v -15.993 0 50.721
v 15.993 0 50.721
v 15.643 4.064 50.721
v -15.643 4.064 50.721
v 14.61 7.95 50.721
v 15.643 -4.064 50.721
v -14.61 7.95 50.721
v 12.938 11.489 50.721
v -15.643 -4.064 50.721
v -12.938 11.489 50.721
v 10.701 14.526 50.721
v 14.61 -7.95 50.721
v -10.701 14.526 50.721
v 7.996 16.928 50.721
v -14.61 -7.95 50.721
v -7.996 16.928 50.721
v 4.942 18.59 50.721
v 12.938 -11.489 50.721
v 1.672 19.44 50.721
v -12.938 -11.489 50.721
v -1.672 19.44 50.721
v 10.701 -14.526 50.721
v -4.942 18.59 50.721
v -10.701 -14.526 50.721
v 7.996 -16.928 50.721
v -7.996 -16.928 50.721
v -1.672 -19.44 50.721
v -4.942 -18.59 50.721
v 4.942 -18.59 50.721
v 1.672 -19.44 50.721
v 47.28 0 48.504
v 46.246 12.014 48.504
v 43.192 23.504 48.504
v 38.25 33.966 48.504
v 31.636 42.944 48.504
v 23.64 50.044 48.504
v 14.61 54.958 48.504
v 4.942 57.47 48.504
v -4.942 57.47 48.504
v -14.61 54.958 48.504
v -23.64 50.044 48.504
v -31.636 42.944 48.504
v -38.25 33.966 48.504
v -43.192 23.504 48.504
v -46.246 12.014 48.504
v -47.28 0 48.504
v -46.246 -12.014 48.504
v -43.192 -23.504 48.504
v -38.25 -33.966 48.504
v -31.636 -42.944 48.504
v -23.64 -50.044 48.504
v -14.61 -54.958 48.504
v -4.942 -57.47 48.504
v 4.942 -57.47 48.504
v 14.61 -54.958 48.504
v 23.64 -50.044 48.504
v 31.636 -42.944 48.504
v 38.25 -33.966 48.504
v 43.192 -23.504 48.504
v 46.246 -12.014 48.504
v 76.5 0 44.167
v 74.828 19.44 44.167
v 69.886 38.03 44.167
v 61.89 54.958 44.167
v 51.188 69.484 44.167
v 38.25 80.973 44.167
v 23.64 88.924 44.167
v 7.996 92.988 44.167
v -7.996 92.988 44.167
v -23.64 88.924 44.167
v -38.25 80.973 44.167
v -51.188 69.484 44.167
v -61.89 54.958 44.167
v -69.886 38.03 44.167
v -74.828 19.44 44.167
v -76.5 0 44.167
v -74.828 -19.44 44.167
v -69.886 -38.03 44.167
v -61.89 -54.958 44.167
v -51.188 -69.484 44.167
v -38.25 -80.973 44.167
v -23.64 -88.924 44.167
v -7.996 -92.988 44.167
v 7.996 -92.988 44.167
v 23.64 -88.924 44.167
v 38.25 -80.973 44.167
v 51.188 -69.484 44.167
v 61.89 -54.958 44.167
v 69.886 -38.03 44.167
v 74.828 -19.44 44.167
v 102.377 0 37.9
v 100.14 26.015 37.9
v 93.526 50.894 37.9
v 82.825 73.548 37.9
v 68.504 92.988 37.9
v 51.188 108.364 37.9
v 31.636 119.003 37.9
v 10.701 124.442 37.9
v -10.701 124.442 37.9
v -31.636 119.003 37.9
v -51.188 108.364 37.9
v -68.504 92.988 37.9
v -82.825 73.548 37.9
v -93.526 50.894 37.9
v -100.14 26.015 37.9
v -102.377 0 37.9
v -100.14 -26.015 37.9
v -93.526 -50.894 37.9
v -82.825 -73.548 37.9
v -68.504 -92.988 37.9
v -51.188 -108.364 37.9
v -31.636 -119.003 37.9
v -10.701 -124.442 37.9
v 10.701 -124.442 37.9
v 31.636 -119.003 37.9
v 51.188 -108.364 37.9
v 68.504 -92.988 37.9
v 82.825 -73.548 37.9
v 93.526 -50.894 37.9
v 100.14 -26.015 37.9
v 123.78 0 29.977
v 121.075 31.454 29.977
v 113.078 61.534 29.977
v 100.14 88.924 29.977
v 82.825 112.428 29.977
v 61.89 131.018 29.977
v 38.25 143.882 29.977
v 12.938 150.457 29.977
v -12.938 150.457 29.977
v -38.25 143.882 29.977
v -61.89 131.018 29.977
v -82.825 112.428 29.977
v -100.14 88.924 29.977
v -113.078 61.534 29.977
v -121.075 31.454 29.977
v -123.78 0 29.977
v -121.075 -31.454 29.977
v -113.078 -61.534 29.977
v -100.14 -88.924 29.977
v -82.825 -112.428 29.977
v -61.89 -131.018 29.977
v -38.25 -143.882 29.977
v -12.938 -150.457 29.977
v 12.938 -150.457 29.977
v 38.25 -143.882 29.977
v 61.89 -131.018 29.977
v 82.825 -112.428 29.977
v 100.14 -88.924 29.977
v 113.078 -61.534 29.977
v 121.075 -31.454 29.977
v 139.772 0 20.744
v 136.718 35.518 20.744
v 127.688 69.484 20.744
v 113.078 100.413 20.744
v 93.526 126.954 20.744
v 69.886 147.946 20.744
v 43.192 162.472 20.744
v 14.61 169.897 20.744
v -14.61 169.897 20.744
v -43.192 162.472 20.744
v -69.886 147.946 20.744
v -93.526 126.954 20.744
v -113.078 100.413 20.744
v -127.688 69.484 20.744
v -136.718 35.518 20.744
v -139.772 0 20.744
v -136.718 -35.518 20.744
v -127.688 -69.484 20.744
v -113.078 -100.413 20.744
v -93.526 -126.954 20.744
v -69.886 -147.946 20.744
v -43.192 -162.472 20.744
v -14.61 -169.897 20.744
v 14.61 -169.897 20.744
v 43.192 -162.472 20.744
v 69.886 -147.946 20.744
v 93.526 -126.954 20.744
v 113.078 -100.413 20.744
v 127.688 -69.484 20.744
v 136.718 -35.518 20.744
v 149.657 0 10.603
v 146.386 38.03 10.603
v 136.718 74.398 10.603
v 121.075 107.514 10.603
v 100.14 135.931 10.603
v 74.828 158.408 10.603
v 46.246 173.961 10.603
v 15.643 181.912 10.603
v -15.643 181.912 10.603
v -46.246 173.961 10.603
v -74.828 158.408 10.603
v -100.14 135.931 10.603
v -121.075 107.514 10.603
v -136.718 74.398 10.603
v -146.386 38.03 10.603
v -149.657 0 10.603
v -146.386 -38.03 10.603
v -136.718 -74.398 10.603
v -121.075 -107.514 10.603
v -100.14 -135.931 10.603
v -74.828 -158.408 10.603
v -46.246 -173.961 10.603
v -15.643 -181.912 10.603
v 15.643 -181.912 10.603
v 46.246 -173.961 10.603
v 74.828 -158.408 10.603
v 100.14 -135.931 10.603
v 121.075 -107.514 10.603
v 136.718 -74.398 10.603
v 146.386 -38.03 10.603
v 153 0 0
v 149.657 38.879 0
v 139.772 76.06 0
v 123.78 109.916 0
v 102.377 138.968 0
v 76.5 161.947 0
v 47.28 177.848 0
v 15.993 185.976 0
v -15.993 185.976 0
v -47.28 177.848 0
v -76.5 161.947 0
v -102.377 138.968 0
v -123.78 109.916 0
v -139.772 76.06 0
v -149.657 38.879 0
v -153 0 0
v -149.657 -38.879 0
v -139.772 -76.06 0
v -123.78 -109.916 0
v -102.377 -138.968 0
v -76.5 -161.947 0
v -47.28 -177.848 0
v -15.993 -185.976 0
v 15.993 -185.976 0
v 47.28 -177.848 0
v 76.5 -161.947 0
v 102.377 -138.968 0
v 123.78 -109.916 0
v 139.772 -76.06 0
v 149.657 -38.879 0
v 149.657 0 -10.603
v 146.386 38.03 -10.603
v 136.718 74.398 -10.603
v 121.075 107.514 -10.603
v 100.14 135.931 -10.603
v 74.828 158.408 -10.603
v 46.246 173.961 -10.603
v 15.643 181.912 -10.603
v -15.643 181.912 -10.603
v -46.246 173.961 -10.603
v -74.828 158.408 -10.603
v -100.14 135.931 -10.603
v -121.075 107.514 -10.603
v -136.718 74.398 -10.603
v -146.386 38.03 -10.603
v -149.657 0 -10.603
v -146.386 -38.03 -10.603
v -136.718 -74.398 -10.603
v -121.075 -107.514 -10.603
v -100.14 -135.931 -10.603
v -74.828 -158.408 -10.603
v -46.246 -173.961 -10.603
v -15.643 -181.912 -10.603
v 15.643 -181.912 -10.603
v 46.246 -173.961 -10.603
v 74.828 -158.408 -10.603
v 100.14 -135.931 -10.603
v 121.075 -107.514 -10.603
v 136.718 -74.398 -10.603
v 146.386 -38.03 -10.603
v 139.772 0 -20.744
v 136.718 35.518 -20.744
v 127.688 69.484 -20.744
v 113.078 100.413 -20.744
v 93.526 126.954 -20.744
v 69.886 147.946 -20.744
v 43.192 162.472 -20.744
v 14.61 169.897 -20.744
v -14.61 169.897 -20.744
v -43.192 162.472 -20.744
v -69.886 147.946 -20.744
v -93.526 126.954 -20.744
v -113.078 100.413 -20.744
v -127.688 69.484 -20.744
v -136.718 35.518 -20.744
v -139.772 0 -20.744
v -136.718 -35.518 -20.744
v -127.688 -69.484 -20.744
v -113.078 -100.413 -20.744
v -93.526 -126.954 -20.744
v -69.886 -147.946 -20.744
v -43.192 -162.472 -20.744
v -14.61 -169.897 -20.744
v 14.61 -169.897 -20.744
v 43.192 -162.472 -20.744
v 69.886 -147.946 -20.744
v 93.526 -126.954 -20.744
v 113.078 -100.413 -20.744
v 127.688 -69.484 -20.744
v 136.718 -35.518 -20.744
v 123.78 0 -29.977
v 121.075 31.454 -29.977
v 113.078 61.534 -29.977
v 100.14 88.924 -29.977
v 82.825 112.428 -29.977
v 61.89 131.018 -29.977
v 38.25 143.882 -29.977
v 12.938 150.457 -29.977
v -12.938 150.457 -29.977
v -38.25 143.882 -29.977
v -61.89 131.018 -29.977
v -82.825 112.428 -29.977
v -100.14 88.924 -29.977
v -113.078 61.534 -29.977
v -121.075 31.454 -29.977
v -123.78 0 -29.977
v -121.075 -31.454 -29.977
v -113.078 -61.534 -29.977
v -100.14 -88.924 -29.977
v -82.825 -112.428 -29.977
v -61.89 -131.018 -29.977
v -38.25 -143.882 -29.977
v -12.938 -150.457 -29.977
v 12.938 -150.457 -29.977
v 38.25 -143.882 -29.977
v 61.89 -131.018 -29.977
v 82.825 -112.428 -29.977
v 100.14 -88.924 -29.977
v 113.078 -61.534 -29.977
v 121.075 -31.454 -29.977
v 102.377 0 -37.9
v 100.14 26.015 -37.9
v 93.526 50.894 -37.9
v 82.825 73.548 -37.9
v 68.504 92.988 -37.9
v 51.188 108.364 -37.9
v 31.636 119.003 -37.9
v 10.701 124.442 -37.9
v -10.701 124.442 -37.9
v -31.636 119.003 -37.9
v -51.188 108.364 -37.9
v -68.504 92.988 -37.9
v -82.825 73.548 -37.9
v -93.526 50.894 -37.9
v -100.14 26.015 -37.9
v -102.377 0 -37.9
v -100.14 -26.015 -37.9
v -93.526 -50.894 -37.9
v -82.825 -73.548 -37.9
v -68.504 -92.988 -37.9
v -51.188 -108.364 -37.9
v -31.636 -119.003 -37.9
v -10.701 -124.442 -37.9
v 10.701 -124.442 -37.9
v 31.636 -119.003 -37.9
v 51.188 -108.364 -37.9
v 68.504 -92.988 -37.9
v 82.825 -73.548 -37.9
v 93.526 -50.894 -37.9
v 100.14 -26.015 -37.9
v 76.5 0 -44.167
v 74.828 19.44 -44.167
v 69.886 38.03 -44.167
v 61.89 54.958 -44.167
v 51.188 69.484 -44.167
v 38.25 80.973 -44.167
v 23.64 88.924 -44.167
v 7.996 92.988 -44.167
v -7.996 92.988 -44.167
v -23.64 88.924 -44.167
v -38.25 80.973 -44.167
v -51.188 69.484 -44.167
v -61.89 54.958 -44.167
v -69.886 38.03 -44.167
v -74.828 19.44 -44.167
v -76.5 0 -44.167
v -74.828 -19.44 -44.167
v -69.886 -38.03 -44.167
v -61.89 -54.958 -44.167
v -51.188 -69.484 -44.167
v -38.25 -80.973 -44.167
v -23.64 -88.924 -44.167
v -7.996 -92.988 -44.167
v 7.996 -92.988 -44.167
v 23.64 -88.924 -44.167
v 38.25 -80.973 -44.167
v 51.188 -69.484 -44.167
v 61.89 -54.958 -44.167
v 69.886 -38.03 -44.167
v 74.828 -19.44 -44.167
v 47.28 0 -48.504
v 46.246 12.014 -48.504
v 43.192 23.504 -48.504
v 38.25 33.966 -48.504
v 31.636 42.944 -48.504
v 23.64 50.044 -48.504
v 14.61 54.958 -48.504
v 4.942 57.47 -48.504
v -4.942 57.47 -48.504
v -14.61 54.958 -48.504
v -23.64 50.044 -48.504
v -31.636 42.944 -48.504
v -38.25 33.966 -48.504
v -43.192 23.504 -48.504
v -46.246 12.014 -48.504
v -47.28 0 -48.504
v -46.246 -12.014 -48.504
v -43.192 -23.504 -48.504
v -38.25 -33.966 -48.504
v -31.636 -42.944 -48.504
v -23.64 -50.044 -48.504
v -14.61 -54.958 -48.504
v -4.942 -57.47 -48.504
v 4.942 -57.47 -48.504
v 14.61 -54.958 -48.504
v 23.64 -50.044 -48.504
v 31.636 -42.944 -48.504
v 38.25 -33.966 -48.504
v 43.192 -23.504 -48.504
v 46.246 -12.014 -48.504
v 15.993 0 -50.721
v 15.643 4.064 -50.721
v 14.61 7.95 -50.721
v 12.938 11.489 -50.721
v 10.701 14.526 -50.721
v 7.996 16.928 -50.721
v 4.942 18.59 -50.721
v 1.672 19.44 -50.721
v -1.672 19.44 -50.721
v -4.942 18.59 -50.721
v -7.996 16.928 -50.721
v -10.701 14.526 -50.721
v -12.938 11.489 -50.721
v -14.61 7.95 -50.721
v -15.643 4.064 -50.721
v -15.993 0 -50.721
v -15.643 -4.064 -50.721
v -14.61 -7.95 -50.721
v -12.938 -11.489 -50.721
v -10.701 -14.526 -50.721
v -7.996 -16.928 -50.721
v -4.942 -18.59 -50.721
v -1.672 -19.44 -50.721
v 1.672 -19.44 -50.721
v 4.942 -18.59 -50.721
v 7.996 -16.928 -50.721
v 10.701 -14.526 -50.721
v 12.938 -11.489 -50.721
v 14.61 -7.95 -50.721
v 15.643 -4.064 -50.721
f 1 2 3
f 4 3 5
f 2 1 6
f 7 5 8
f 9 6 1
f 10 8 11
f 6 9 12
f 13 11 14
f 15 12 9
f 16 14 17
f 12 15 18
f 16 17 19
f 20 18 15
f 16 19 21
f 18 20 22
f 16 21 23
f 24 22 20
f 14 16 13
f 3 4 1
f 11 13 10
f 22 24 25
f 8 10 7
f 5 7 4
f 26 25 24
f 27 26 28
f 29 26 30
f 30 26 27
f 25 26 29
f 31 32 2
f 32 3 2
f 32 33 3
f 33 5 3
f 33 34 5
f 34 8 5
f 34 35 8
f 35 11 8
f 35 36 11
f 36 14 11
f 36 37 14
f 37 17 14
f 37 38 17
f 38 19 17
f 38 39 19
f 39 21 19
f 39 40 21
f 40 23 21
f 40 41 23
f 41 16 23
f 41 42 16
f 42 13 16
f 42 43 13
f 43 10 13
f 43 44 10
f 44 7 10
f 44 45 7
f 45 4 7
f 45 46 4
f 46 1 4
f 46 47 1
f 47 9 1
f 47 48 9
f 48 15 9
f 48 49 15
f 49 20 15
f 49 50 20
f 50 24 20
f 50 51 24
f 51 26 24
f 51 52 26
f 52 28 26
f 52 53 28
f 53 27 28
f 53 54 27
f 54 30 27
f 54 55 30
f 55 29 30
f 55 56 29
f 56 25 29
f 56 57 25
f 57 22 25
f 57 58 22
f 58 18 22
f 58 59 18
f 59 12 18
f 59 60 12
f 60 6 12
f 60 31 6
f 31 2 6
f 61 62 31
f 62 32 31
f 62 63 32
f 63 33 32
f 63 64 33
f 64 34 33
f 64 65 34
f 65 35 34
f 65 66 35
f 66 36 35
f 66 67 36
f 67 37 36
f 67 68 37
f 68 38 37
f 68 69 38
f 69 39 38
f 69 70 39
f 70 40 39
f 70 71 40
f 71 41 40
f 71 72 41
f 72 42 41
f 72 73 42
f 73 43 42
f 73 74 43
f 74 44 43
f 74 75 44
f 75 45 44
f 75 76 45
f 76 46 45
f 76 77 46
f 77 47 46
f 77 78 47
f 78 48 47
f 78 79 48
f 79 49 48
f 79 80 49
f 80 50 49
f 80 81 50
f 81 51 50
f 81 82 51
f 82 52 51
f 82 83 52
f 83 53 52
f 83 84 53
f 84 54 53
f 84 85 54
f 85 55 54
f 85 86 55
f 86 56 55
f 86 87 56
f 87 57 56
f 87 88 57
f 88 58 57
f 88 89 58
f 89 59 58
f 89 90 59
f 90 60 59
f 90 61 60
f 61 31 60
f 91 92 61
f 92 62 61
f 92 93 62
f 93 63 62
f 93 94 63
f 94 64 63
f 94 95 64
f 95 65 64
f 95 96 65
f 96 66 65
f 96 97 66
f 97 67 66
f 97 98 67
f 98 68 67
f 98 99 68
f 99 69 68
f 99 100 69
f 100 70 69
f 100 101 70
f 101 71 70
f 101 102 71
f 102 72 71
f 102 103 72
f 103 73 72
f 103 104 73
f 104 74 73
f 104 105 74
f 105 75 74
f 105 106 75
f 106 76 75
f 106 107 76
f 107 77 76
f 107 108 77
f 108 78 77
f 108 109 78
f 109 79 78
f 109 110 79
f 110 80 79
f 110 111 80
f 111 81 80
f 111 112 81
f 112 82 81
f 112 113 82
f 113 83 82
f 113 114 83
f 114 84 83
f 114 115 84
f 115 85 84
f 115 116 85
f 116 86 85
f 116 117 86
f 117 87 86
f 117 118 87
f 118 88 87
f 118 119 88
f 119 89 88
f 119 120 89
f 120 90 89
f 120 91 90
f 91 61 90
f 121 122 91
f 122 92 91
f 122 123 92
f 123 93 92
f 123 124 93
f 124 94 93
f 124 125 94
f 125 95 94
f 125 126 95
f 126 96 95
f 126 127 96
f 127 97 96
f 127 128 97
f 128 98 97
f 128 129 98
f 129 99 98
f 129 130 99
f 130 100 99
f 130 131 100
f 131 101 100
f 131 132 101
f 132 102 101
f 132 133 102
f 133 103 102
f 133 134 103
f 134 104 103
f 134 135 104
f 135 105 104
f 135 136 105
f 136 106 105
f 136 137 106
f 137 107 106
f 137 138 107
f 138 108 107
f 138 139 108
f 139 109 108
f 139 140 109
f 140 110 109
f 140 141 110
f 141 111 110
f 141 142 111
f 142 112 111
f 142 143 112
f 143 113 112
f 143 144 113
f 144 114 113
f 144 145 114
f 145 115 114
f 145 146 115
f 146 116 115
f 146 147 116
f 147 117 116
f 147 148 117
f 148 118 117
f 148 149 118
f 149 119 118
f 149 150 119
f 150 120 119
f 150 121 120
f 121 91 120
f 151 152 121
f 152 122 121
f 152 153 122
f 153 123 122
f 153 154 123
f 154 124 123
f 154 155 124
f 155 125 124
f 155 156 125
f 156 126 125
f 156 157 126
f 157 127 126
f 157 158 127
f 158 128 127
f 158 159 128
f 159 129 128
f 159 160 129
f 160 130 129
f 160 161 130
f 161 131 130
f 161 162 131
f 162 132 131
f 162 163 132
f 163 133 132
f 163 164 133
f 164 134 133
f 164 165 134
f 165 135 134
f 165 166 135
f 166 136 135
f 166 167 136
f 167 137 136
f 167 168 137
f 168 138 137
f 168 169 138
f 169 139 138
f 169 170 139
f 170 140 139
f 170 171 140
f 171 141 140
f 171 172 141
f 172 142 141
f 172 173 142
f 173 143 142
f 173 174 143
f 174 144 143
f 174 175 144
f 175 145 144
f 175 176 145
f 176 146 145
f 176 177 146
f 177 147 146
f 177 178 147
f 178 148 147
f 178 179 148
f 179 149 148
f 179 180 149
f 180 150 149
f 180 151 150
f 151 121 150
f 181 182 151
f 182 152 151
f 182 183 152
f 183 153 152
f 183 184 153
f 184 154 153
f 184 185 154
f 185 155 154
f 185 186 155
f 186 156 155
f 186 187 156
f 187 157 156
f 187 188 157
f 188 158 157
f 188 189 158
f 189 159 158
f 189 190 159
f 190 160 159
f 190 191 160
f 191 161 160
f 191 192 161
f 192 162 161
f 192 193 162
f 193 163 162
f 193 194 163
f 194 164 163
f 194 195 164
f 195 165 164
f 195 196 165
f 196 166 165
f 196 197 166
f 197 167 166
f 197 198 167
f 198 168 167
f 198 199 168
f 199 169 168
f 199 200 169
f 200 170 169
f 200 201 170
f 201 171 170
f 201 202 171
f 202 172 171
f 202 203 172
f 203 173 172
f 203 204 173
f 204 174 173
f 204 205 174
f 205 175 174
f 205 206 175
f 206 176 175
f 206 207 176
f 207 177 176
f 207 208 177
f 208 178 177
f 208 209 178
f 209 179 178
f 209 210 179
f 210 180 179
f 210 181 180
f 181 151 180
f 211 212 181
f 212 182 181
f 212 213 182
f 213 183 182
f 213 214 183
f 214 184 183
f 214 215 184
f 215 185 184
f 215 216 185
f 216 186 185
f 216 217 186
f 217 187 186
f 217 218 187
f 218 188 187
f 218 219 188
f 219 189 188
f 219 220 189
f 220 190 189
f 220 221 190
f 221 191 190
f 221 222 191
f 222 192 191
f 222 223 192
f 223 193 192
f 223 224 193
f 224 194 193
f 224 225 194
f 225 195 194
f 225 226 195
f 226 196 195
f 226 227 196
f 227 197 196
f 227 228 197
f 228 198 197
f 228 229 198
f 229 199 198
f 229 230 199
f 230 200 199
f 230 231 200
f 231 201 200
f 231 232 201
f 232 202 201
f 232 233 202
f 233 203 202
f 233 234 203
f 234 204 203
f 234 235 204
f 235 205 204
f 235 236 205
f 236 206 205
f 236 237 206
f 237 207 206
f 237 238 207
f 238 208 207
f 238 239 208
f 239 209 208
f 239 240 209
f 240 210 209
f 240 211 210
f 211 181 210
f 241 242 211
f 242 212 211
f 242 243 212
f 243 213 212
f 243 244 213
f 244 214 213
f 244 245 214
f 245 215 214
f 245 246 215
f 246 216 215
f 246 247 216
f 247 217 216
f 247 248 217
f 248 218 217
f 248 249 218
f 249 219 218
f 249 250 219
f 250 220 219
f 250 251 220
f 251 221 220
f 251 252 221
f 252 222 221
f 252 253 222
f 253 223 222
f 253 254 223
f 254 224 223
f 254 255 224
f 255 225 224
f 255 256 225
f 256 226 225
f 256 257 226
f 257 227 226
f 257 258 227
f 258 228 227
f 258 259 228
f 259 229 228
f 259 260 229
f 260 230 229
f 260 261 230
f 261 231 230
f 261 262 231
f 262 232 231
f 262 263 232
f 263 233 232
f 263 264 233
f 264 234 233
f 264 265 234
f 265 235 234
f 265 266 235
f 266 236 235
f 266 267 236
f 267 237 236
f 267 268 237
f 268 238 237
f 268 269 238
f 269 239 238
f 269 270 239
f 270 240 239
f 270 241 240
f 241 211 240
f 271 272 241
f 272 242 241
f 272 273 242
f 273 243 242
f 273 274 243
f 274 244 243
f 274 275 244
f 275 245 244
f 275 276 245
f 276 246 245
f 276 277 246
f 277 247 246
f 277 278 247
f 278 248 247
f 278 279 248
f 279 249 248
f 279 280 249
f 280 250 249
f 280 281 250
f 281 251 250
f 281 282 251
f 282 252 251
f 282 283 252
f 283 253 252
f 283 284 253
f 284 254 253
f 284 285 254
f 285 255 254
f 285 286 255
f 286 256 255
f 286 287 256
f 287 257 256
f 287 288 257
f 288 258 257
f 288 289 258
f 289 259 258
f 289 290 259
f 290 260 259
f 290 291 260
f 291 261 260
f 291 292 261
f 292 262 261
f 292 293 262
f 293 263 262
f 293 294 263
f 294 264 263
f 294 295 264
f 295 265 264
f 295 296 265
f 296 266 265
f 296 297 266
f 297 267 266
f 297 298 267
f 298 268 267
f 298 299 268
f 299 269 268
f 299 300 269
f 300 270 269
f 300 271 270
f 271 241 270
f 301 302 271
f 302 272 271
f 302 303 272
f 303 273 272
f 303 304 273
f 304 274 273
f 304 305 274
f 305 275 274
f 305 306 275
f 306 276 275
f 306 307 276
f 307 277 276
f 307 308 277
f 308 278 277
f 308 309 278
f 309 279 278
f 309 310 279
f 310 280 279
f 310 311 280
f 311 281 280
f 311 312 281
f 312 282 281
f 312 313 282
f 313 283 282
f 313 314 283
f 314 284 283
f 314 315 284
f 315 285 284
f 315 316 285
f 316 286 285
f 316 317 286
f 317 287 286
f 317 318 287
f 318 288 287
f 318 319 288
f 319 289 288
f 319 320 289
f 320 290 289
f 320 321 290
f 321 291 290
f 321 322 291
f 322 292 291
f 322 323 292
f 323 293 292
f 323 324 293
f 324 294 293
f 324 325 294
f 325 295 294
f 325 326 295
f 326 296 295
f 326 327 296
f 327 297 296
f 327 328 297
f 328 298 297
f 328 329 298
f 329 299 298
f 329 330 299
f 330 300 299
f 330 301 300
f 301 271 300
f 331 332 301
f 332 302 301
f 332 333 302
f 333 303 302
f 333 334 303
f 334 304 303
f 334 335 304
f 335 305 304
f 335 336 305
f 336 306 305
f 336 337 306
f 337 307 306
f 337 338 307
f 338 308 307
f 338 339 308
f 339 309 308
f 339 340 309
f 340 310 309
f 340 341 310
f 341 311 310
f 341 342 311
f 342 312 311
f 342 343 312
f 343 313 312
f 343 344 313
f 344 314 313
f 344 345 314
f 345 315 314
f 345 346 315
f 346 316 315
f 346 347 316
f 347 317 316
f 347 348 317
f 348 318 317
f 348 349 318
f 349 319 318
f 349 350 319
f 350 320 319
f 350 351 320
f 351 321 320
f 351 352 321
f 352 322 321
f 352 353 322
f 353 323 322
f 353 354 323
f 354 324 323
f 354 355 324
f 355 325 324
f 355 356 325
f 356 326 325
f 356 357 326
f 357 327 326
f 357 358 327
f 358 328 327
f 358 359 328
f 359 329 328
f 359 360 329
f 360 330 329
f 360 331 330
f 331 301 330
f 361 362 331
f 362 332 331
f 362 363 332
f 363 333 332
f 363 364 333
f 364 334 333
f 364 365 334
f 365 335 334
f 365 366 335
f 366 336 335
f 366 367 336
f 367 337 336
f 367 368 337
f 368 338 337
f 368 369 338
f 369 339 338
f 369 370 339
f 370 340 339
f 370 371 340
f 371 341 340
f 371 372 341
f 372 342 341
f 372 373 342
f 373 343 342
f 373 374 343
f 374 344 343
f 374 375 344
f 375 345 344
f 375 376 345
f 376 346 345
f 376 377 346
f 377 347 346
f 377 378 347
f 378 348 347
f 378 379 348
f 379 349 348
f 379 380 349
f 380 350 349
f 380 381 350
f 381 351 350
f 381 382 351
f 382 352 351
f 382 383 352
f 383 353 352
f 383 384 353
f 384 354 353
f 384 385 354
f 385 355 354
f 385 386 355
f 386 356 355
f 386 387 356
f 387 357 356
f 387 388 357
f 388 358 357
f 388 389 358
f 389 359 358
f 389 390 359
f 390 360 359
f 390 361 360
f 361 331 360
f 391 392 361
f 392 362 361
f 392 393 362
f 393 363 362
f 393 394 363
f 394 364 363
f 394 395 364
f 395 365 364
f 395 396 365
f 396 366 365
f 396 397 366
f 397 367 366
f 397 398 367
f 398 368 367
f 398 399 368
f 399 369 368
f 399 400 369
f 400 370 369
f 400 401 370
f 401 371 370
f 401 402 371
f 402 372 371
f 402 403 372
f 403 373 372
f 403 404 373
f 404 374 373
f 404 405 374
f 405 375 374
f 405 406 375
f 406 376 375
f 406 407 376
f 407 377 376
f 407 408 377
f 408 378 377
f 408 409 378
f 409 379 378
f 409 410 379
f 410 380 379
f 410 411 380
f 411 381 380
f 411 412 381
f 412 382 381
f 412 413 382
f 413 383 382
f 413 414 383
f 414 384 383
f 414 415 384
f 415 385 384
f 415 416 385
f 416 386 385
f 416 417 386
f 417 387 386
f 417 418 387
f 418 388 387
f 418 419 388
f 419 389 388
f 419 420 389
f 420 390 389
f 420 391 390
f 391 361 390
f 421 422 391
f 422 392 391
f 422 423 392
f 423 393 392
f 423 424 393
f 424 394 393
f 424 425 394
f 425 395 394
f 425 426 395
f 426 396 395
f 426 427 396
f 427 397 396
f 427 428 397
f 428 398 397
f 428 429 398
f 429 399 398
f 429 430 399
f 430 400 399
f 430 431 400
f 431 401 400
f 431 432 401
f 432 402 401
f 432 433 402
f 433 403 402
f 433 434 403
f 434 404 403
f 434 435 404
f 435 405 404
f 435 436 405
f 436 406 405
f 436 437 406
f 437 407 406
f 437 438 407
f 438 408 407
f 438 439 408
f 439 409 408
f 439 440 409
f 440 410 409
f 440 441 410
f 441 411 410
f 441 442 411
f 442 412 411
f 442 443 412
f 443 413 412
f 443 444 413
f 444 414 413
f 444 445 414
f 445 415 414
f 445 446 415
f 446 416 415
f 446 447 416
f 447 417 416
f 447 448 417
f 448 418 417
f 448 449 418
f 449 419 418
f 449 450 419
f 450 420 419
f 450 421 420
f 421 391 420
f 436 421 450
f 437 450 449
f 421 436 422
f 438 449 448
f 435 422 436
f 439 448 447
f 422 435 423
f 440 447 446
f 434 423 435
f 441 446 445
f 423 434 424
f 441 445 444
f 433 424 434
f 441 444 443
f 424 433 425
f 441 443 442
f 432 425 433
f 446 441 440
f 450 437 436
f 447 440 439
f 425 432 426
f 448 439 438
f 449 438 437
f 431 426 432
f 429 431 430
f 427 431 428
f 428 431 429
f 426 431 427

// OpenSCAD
// Generated by SolidPython 1.0.1 on 2020-07-29 00:46:48


scale(v = [9, 11, 3]) {
	sphere(r = 17);
}
/***********************************************
*********      SolidPython code:      **********
************************************************
 
# import packages: SolidPython
from solid import *
from solid.utils import *
from itertools import chain, combinations, permutations


class Resize:

    def __init__(self, scad_file):
        self.scad_file = scad_file
        #self.scad_file = import_scad(scad_file)
        # cone/cylinder param:
        self.r1 = 0
        self.r2 = 0
        self.h = 0
        # rectangular prism param:
        self.w = 0
        self.l = 0
        # ellipse param:
        self.r = 0

    # import OpenScad code (file name corresponds to shape)


    # classify shape + parameters
    def assign(self, param1, param2, param3):
        if self.scad_file == 'cone.scad':
            self.r1 = param1
            self.r2 = param2
            self.h = param3
        elif self.scad_file == 'cylinder.scad':
            self.r1 = param1
            self.r2 = param2
            self.h = param3
        elif self.scad_file == 'rectangularPrism.scad':
            self.h = param1
            self.l = param2
            self.w = param3
        else:
            self.r = param1
            self.h = param2

    # resize parameters
    def iterate(self):
        x = range(3, 20, 2)
        i = 1
        if self.scad_file == 'cone.scad':
            tempList = list(permutations(x, 2))
            for temp in tempList:
                param1 = temp[0]
                param2 = temp[1]
                filepath = 'produced_scad_files/' + 'cone' + str(param1) + '_' + str(param2) + '_' + '.scad'
                scad_render_to_file(cylinder(h=param1, r1=param2, r2=0), filepath)

        elif self.scad_file == 'cylinder.scad':
            tempList = list(permutations(x, 3))
            for temp in tempList:
                param1 = temp[0]
                param2 = temp[1]
                filepath = 'produced_scad_files/' + 'cylinder' + str(param1) + '_' + str(param2) + '_' + '.scad'
                scad_render_to_file(cylinder(h=param1, r1=param2, r2=param2), filepath)

        elif self.scad_file == 'rectangularPrism.scad':
            tempList = list(permutations(x, 3))
            for temp in tempList:
                param1 = temp[0]
                param2 = temp[1]
                param3 = temp[2]
                filepath = 'produced_scad_files/' + 'rectangularPrism' + str(param1) + '_' + str(param2) + '_' + str(
                    param3) + '.scad'
                scad_render_to_file(cube(size=(param1, param2, param3)), filepath)

        elif self.scad_file == 'ellipse.scad':
            tempList = list(permutations(x, 4))
            for temp in tempList:
                param1 = temp[0]
                param2 = temp[1]
                param3 = temp[2]
                param4 = temp[3]
                filepath = 'produced_scad_files/' + 'ellipse' + str(param1) + '_' + str(param2) + '_' + str(param3) + '_' + str(param4) + '.scad'
                scad_render_to_file(scale([param1, param2, param3])(sphere(r=param4)), filepath)

    def render_to_scadfile(self):
        scad_render_to_file(scad, 'example.scad') 
 
************************************************/
